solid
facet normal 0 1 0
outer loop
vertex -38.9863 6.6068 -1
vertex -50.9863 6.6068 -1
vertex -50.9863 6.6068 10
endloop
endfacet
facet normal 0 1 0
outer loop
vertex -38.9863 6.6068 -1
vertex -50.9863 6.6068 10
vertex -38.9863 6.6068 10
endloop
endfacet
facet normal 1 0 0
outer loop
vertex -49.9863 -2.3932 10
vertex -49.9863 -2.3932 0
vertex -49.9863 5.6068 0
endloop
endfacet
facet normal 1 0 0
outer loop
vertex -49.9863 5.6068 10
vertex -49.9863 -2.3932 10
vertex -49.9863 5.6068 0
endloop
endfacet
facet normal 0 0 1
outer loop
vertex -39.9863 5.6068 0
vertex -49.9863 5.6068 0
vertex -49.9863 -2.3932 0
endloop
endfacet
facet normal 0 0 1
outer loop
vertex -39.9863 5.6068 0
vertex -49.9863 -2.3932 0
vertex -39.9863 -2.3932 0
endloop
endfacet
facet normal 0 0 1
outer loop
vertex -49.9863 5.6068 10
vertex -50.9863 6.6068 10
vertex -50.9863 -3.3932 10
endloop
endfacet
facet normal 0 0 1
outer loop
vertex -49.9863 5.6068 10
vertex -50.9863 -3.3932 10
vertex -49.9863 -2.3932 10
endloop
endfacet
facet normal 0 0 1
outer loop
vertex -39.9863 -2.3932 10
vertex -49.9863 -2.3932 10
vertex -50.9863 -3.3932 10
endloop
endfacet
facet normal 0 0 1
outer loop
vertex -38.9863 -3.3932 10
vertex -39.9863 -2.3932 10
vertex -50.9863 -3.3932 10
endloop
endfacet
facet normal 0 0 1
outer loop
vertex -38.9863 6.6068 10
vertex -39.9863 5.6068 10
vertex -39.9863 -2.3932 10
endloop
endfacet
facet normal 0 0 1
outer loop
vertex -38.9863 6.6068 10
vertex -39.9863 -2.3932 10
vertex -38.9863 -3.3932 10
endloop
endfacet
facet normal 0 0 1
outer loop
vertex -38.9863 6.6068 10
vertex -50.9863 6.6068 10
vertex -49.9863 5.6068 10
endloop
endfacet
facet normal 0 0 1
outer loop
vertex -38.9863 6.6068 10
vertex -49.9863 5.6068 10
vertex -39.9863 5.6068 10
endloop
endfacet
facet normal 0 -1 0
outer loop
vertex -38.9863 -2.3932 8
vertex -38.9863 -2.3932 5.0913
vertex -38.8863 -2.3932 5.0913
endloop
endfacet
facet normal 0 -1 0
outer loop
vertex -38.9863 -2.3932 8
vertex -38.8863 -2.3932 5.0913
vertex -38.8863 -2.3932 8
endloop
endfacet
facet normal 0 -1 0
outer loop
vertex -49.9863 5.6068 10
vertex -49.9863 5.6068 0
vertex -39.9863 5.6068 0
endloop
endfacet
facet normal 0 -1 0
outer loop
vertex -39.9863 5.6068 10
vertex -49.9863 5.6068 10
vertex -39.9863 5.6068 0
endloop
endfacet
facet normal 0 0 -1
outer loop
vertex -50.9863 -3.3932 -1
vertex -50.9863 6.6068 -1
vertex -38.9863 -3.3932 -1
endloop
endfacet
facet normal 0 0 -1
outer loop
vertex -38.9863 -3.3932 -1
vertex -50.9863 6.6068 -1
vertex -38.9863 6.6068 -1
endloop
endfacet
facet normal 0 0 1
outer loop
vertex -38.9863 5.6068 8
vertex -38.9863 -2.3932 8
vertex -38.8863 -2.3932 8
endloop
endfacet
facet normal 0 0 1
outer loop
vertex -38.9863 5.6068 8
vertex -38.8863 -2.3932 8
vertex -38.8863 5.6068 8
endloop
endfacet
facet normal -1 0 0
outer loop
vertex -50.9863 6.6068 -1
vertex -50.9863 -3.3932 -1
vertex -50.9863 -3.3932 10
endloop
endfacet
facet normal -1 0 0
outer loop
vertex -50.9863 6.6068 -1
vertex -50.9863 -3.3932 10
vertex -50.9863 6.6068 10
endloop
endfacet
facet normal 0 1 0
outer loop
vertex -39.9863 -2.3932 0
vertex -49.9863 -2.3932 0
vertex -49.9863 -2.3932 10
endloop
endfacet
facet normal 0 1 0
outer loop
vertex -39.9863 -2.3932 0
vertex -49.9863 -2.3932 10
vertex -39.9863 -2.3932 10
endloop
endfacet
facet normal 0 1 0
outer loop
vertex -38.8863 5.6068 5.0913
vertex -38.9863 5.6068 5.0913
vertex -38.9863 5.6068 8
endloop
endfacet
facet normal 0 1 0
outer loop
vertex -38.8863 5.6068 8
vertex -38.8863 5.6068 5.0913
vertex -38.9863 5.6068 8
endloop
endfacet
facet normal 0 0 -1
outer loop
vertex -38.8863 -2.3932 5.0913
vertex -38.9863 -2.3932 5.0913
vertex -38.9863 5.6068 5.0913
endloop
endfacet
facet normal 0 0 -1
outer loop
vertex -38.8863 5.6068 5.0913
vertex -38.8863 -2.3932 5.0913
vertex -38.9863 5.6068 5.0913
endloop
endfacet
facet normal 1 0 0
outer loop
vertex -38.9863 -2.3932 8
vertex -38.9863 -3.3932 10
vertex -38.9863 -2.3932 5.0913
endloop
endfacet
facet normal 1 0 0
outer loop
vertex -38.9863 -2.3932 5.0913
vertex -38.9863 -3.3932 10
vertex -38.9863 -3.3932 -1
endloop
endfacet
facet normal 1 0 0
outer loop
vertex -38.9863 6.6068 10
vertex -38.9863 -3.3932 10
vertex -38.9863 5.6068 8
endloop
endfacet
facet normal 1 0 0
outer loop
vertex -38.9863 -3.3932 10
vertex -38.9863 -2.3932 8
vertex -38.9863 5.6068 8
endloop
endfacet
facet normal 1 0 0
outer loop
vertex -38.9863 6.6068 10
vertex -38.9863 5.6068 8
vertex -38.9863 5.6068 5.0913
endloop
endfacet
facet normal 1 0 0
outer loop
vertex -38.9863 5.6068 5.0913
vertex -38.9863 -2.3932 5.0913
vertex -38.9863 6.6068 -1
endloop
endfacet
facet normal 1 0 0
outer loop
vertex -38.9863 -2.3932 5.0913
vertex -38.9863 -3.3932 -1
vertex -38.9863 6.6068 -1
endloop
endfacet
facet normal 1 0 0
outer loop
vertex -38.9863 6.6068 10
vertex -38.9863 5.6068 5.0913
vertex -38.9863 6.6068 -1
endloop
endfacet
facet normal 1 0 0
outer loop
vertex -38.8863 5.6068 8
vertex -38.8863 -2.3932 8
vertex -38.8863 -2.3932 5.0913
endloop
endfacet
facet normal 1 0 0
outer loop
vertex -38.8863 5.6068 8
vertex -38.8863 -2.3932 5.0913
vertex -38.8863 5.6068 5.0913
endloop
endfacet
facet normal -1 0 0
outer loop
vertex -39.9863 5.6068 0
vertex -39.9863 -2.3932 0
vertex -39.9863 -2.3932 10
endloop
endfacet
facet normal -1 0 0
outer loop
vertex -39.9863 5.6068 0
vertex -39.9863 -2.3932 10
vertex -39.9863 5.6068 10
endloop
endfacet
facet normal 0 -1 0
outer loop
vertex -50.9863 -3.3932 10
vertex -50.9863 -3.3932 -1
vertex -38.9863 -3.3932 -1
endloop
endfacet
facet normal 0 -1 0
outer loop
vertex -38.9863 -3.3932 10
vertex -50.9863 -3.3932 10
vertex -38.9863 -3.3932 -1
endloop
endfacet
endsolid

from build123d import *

# Parameters (mm, degrees)
F0_W     = 10
F0_H     = 8
F1_DEPTH = 10
F2_T     = 1
F3_W     = 8
F3_H     = 2.908741124
F4_DEPTH = 0.1


with BuildPart() as f1:
    # F0 (on Top) → F1 (new body)
    with BuildSketch(Plane.XY):
        with Locations((-44.9863001704, 1.6067679121)):
            Rectangle(F0_W, F0_H)
    extrude(amount=F1_DEPTH)

    # F2
    f2_openings = [f1.faces().sort_by_distance(p)[0] for p in [
        (-44.9863, 1.606768, 10),
    ]]
    offset(amount=F2_T, openings=f2_openings, kind=Kind.INTERSECTION)

    # F3 (on face) → F4 (join)
    with BuildSketch(Plane.YZ.offset(-38.9863001704)):
        with Locations((1.6067679121, 6.545629438)):
            Rectangle(F3_W, F3_H)
    extrude(amount=F4_DEPTH)


solid = f1.part
